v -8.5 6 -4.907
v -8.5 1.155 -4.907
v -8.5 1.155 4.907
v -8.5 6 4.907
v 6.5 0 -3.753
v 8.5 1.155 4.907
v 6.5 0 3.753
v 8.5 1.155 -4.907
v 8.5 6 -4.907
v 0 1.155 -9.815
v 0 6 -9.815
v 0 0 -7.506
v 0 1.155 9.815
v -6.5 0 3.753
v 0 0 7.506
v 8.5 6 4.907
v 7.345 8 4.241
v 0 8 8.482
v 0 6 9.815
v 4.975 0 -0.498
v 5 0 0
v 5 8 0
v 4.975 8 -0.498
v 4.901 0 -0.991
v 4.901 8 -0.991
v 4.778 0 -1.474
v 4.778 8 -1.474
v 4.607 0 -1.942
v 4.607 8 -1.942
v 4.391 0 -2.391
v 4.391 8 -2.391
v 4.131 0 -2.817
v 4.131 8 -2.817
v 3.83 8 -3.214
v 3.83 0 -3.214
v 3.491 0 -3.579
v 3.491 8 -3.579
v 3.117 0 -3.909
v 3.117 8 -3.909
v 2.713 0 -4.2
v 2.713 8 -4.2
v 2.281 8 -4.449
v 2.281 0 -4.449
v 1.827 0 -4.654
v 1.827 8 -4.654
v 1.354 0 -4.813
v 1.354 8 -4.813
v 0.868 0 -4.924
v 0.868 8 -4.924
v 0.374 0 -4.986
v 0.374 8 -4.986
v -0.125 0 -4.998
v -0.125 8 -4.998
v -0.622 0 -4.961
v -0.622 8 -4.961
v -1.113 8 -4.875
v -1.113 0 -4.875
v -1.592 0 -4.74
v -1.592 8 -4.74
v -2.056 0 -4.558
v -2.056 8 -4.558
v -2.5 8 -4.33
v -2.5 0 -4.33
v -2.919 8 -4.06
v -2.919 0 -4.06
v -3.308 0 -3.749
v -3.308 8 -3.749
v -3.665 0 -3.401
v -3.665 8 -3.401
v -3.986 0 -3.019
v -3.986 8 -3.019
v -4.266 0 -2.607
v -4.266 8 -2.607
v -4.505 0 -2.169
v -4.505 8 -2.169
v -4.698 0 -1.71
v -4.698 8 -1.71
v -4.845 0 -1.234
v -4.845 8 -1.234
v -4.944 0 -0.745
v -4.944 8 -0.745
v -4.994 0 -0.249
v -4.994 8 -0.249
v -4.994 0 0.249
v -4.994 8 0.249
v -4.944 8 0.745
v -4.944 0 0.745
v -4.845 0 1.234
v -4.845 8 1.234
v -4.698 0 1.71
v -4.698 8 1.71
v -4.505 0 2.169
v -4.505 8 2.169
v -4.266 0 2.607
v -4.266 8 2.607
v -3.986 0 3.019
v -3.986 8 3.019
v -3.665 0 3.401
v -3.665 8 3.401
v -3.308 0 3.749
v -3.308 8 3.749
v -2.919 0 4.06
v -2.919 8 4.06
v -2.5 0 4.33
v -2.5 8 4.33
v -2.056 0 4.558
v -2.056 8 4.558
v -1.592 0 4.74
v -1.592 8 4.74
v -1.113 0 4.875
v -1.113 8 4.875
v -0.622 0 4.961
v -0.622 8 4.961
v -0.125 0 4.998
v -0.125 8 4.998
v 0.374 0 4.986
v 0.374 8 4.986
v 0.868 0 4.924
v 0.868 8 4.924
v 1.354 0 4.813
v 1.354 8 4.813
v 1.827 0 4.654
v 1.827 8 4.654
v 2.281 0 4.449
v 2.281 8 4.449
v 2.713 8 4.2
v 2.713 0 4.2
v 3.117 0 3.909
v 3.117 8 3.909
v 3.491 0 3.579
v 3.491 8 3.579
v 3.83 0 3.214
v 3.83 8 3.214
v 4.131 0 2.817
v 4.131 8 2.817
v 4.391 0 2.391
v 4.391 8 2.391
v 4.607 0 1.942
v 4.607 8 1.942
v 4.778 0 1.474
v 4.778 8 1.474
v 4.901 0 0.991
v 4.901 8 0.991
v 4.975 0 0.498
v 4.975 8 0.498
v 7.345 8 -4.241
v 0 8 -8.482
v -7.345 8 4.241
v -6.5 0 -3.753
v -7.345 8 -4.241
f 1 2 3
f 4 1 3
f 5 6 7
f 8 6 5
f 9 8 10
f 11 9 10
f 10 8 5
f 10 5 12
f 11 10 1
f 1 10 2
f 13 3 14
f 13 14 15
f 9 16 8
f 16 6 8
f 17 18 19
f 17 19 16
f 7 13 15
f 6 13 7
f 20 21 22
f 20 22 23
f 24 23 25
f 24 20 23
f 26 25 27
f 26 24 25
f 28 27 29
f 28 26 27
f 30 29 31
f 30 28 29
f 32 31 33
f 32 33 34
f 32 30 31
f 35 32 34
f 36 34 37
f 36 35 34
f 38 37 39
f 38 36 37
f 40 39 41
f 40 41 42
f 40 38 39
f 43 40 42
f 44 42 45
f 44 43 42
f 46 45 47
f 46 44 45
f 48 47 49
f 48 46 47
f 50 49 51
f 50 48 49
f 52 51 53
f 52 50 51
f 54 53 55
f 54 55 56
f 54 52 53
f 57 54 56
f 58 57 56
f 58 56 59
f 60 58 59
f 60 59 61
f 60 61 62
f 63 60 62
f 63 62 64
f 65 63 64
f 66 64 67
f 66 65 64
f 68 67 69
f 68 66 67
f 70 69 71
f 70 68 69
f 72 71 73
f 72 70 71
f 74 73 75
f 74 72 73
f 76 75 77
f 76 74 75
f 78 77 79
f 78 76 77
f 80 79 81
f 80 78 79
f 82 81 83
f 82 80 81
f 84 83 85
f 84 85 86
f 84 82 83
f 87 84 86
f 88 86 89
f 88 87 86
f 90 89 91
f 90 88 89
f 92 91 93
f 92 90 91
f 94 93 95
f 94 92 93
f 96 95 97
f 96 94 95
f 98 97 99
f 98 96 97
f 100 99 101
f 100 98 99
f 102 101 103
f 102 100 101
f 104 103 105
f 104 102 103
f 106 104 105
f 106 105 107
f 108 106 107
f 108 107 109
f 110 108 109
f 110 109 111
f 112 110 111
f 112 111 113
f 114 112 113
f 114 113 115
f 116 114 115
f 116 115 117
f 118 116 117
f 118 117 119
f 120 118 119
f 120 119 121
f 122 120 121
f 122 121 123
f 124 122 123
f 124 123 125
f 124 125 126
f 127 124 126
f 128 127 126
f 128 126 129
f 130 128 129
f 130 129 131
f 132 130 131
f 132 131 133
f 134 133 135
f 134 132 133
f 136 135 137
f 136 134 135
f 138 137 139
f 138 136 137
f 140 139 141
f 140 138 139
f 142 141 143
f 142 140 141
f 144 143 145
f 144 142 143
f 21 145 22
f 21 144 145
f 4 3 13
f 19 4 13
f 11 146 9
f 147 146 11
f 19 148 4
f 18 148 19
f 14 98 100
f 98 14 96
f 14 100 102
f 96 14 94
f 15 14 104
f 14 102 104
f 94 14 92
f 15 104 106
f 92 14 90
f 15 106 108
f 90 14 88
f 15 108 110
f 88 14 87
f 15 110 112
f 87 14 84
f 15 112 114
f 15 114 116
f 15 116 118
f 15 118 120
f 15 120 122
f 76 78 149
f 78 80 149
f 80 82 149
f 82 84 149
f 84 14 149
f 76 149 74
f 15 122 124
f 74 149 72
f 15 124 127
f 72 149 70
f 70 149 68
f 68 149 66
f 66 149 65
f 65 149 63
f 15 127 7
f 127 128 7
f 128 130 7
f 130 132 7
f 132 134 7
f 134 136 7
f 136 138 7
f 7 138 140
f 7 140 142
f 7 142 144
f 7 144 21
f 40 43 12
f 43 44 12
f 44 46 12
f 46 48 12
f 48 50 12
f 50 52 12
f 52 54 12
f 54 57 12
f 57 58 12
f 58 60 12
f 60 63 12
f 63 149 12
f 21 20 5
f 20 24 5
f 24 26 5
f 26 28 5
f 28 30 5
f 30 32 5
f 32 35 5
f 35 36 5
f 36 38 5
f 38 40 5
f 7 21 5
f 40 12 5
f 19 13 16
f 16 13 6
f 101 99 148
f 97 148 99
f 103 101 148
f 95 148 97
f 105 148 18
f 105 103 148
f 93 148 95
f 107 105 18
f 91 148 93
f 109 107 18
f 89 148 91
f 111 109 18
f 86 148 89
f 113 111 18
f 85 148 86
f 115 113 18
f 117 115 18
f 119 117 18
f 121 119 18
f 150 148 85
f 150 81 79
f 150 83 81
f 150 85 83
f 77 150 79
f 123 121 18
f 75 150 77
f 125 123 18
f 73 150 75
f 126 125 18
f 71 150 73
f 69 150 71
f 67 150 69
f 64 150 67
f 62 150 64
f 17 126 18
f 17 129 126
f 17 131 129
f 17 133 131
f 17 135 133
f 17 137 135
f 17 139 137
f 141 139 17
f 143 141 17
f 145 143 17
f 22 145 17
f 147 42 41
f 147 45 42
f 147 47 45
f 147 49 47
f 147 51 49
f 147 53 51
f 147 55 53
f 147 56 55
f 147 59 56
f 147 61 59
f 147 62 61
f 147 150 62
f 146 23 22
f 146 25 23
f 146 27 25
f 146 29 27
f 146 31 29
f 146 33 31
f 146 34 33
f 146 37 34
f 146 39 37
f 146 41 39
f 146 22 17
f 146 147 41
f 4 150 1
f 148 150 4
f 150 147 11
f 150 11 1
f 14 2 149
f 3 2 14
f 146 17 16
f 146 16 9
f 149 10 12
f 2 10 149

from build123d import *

# Parameters (mm, degrees)
SKETCH_1_R             = 5
EXTRUDE_1_DEPTH        = 8
CHAMFER_1_SIZE         = 2
CHAMFER_1_SIZE2        = 1.154700538
CHAMFER_1_PART_2_SIZE  = 2
CHAMFER_1_PART_2_SIZE2 = 1.154700538
CHAMFER_1_PART_3_SIZE  = 2
CHAMFER_1_PART_3_SIZE2 = 1.154700538
CHAMFER_1_PART_4_SIZE  = 2
CHAMFER_1_PART_4_SIZE2 = 1.154700538
CHAMFER_1_PART_5_SIZE  = 2
CHAMFER_1_PART_5_SIZE2 = 1.154700538
CHAMFER_1_PART_6_SIZE  = 2
CHAMFER_1_PART_6_SIZE2 = 1.154700538
CHAMFER_1_PART_7_SIZE  = 2
CHAMFER_1_PART_7_SIZE2 = 1.154700538


with BuildPart() as part:
    # Эскиз1 → Бобышка-Вытянуть1 (new body)
    with BuildSketch(Plane(origin=(0, 0, 0), x_dir=(1, 0, 0), z_dir=(0, 1, 0))):
        Polygon((8.5, -4.907477288), (8.5, 4.907477288), (0, 9.814954576), (-8.5, 4.907477288), (-8.5, -4.907477288), (0, -9.814954576), align=None)
        Circle(SKETCH_1_R, mode=Mode.SUBTRACT)
    extrude(amount=EXTRUDE_1_DEPTH)

    # Фаска1
    chamfer_1_edges = [part.edges().sort_by_distance(p)[0] for p in [
        (4.25, 8, -7.361215932),
    ]]
    chamfer_1_side = [part.faces().sort_by_distance(p)[0] for p in [
        (4.25, 4, -7.361215932),
    ]]
    chamfer(chamfer_1_edges, length=CHAMFER_1_SIZE, length2=CHAMFER_1_SIZE2, reference=chamfer_1_side[0])

    # Фаска1 part 2
    chamfer_1_part_2_edges = [part.edges().sort_by_distance(p)[0] for p in [
        (-4.25, 8, -7.361215932),
    ]]
    chamfer_1_part_2_side = [part.faces().sort_by_distance(p)[0] for p in [
        (-4.25, 4, -7.361215932),
    ]]
    chamfer(chamfer_1_part_2_edges, length=CHAMFER_1_PART_2_SIZE, length2=CHAMFER_1_PART_2_SIZE2, reference=chamfer_1_part_2_side[0])

    # Фаска1 part 3
    chamfer_1_part_3_edges = [part.edges().sort_by_distance(p)[0] for p in [
        (-8.5, 8, 0),
    ]]
    chamfer_1_part_3_side = [part.faces().sort_by_distance(p)[0] for p in [
        (-8.5, 4, 0),
    ]]
    chamfer(chamfer_1_part_3_edges, length=CHAMFER_1_PART_3_SIZE, length2=CHAMFER_1_PART_3_SIZE2, reference=chamfer_1_part_3_side[0])

    # Фаска1 part 4
    chamfer_1_part_4_edges = [part.edges().sort_by_distance(p)[0] for p in [
        (-4.25, 8, 7.361215932),
    ]]
    chamfer_1_part_4_side = [part.faces().sort_by_distance(p)[0] for p in [
        (-4.25, 4, 7.361215932),
    ]]
    chamfer(chamfer_1_part_4_edges, length=CHAMFER_1_PART_4_SIZE, length2=CHAMFER_1_PART_4_SIZE2, reference=chamfer_1_part_4_side[0])

    # Фаска1 part 5
    chamfer_1_part_5_edges = [part.edges().sort_by_distance(p)[0] for p in [
        (4.25, 8, 7.361215932),
    ]]
    chamfer_1_part_5_side = [part.faces().sort_by_distance(p)[0] for p in [
        (4.25, 4, 7.361215932),
    ]]
    chamfer(chamfer_1_part_5_edges, length=CHAMFER_1_PART_5_SIZE, length2=CHAMFER_1_PART_5_SIZE2, reference=chamfer_1_part_5_side[0])

    # Фаска1 part 6
    chamfer_1_part_6_edges = [part.edges().sort_by_distance(p)[0] for p in [
        (-4.25, 0, 7.361215932),
        (-8.5, 0, 0),
        (-4.25, 0, -7.361215932),
        (4.25, 0, -7.361215932),
        (8.5, 0, 0),
        (4.25, 0, 7.361215932),
    ]]
    chamfer_1_part_6_side = [part.faces().sort_by_distance(p)[0] for p in [
        (8.240320711, 0, 0),
    ]]
    chamfer(chamfer_1_part_6_edges, length=CHAMFER_1_PART_6_SIZE, length2=CHAMFER_1_PART_6_SIZE2, reference=chamfer_1_part_6_side[0])

    # Фаска1 part 7
    chamfer_1_part_7_edges = [part.edges().sort_by_distance(p)[0] for p in [
        (8.5, 8, 0),
    ]]
    chamfer_1_part_7_side = [part.faces().sort_by_distance(p)[0] for p in [
        (8.5, 4, 0),
    ]]
    chamfer(chamfer_1_part_7_edges, length=CHAMFER_1_PART_7_SIZE, length2=CHAMFER_1_PART_7_SIZE2, reference=chamfer_1_part_7_side[0])


solid = part.part
